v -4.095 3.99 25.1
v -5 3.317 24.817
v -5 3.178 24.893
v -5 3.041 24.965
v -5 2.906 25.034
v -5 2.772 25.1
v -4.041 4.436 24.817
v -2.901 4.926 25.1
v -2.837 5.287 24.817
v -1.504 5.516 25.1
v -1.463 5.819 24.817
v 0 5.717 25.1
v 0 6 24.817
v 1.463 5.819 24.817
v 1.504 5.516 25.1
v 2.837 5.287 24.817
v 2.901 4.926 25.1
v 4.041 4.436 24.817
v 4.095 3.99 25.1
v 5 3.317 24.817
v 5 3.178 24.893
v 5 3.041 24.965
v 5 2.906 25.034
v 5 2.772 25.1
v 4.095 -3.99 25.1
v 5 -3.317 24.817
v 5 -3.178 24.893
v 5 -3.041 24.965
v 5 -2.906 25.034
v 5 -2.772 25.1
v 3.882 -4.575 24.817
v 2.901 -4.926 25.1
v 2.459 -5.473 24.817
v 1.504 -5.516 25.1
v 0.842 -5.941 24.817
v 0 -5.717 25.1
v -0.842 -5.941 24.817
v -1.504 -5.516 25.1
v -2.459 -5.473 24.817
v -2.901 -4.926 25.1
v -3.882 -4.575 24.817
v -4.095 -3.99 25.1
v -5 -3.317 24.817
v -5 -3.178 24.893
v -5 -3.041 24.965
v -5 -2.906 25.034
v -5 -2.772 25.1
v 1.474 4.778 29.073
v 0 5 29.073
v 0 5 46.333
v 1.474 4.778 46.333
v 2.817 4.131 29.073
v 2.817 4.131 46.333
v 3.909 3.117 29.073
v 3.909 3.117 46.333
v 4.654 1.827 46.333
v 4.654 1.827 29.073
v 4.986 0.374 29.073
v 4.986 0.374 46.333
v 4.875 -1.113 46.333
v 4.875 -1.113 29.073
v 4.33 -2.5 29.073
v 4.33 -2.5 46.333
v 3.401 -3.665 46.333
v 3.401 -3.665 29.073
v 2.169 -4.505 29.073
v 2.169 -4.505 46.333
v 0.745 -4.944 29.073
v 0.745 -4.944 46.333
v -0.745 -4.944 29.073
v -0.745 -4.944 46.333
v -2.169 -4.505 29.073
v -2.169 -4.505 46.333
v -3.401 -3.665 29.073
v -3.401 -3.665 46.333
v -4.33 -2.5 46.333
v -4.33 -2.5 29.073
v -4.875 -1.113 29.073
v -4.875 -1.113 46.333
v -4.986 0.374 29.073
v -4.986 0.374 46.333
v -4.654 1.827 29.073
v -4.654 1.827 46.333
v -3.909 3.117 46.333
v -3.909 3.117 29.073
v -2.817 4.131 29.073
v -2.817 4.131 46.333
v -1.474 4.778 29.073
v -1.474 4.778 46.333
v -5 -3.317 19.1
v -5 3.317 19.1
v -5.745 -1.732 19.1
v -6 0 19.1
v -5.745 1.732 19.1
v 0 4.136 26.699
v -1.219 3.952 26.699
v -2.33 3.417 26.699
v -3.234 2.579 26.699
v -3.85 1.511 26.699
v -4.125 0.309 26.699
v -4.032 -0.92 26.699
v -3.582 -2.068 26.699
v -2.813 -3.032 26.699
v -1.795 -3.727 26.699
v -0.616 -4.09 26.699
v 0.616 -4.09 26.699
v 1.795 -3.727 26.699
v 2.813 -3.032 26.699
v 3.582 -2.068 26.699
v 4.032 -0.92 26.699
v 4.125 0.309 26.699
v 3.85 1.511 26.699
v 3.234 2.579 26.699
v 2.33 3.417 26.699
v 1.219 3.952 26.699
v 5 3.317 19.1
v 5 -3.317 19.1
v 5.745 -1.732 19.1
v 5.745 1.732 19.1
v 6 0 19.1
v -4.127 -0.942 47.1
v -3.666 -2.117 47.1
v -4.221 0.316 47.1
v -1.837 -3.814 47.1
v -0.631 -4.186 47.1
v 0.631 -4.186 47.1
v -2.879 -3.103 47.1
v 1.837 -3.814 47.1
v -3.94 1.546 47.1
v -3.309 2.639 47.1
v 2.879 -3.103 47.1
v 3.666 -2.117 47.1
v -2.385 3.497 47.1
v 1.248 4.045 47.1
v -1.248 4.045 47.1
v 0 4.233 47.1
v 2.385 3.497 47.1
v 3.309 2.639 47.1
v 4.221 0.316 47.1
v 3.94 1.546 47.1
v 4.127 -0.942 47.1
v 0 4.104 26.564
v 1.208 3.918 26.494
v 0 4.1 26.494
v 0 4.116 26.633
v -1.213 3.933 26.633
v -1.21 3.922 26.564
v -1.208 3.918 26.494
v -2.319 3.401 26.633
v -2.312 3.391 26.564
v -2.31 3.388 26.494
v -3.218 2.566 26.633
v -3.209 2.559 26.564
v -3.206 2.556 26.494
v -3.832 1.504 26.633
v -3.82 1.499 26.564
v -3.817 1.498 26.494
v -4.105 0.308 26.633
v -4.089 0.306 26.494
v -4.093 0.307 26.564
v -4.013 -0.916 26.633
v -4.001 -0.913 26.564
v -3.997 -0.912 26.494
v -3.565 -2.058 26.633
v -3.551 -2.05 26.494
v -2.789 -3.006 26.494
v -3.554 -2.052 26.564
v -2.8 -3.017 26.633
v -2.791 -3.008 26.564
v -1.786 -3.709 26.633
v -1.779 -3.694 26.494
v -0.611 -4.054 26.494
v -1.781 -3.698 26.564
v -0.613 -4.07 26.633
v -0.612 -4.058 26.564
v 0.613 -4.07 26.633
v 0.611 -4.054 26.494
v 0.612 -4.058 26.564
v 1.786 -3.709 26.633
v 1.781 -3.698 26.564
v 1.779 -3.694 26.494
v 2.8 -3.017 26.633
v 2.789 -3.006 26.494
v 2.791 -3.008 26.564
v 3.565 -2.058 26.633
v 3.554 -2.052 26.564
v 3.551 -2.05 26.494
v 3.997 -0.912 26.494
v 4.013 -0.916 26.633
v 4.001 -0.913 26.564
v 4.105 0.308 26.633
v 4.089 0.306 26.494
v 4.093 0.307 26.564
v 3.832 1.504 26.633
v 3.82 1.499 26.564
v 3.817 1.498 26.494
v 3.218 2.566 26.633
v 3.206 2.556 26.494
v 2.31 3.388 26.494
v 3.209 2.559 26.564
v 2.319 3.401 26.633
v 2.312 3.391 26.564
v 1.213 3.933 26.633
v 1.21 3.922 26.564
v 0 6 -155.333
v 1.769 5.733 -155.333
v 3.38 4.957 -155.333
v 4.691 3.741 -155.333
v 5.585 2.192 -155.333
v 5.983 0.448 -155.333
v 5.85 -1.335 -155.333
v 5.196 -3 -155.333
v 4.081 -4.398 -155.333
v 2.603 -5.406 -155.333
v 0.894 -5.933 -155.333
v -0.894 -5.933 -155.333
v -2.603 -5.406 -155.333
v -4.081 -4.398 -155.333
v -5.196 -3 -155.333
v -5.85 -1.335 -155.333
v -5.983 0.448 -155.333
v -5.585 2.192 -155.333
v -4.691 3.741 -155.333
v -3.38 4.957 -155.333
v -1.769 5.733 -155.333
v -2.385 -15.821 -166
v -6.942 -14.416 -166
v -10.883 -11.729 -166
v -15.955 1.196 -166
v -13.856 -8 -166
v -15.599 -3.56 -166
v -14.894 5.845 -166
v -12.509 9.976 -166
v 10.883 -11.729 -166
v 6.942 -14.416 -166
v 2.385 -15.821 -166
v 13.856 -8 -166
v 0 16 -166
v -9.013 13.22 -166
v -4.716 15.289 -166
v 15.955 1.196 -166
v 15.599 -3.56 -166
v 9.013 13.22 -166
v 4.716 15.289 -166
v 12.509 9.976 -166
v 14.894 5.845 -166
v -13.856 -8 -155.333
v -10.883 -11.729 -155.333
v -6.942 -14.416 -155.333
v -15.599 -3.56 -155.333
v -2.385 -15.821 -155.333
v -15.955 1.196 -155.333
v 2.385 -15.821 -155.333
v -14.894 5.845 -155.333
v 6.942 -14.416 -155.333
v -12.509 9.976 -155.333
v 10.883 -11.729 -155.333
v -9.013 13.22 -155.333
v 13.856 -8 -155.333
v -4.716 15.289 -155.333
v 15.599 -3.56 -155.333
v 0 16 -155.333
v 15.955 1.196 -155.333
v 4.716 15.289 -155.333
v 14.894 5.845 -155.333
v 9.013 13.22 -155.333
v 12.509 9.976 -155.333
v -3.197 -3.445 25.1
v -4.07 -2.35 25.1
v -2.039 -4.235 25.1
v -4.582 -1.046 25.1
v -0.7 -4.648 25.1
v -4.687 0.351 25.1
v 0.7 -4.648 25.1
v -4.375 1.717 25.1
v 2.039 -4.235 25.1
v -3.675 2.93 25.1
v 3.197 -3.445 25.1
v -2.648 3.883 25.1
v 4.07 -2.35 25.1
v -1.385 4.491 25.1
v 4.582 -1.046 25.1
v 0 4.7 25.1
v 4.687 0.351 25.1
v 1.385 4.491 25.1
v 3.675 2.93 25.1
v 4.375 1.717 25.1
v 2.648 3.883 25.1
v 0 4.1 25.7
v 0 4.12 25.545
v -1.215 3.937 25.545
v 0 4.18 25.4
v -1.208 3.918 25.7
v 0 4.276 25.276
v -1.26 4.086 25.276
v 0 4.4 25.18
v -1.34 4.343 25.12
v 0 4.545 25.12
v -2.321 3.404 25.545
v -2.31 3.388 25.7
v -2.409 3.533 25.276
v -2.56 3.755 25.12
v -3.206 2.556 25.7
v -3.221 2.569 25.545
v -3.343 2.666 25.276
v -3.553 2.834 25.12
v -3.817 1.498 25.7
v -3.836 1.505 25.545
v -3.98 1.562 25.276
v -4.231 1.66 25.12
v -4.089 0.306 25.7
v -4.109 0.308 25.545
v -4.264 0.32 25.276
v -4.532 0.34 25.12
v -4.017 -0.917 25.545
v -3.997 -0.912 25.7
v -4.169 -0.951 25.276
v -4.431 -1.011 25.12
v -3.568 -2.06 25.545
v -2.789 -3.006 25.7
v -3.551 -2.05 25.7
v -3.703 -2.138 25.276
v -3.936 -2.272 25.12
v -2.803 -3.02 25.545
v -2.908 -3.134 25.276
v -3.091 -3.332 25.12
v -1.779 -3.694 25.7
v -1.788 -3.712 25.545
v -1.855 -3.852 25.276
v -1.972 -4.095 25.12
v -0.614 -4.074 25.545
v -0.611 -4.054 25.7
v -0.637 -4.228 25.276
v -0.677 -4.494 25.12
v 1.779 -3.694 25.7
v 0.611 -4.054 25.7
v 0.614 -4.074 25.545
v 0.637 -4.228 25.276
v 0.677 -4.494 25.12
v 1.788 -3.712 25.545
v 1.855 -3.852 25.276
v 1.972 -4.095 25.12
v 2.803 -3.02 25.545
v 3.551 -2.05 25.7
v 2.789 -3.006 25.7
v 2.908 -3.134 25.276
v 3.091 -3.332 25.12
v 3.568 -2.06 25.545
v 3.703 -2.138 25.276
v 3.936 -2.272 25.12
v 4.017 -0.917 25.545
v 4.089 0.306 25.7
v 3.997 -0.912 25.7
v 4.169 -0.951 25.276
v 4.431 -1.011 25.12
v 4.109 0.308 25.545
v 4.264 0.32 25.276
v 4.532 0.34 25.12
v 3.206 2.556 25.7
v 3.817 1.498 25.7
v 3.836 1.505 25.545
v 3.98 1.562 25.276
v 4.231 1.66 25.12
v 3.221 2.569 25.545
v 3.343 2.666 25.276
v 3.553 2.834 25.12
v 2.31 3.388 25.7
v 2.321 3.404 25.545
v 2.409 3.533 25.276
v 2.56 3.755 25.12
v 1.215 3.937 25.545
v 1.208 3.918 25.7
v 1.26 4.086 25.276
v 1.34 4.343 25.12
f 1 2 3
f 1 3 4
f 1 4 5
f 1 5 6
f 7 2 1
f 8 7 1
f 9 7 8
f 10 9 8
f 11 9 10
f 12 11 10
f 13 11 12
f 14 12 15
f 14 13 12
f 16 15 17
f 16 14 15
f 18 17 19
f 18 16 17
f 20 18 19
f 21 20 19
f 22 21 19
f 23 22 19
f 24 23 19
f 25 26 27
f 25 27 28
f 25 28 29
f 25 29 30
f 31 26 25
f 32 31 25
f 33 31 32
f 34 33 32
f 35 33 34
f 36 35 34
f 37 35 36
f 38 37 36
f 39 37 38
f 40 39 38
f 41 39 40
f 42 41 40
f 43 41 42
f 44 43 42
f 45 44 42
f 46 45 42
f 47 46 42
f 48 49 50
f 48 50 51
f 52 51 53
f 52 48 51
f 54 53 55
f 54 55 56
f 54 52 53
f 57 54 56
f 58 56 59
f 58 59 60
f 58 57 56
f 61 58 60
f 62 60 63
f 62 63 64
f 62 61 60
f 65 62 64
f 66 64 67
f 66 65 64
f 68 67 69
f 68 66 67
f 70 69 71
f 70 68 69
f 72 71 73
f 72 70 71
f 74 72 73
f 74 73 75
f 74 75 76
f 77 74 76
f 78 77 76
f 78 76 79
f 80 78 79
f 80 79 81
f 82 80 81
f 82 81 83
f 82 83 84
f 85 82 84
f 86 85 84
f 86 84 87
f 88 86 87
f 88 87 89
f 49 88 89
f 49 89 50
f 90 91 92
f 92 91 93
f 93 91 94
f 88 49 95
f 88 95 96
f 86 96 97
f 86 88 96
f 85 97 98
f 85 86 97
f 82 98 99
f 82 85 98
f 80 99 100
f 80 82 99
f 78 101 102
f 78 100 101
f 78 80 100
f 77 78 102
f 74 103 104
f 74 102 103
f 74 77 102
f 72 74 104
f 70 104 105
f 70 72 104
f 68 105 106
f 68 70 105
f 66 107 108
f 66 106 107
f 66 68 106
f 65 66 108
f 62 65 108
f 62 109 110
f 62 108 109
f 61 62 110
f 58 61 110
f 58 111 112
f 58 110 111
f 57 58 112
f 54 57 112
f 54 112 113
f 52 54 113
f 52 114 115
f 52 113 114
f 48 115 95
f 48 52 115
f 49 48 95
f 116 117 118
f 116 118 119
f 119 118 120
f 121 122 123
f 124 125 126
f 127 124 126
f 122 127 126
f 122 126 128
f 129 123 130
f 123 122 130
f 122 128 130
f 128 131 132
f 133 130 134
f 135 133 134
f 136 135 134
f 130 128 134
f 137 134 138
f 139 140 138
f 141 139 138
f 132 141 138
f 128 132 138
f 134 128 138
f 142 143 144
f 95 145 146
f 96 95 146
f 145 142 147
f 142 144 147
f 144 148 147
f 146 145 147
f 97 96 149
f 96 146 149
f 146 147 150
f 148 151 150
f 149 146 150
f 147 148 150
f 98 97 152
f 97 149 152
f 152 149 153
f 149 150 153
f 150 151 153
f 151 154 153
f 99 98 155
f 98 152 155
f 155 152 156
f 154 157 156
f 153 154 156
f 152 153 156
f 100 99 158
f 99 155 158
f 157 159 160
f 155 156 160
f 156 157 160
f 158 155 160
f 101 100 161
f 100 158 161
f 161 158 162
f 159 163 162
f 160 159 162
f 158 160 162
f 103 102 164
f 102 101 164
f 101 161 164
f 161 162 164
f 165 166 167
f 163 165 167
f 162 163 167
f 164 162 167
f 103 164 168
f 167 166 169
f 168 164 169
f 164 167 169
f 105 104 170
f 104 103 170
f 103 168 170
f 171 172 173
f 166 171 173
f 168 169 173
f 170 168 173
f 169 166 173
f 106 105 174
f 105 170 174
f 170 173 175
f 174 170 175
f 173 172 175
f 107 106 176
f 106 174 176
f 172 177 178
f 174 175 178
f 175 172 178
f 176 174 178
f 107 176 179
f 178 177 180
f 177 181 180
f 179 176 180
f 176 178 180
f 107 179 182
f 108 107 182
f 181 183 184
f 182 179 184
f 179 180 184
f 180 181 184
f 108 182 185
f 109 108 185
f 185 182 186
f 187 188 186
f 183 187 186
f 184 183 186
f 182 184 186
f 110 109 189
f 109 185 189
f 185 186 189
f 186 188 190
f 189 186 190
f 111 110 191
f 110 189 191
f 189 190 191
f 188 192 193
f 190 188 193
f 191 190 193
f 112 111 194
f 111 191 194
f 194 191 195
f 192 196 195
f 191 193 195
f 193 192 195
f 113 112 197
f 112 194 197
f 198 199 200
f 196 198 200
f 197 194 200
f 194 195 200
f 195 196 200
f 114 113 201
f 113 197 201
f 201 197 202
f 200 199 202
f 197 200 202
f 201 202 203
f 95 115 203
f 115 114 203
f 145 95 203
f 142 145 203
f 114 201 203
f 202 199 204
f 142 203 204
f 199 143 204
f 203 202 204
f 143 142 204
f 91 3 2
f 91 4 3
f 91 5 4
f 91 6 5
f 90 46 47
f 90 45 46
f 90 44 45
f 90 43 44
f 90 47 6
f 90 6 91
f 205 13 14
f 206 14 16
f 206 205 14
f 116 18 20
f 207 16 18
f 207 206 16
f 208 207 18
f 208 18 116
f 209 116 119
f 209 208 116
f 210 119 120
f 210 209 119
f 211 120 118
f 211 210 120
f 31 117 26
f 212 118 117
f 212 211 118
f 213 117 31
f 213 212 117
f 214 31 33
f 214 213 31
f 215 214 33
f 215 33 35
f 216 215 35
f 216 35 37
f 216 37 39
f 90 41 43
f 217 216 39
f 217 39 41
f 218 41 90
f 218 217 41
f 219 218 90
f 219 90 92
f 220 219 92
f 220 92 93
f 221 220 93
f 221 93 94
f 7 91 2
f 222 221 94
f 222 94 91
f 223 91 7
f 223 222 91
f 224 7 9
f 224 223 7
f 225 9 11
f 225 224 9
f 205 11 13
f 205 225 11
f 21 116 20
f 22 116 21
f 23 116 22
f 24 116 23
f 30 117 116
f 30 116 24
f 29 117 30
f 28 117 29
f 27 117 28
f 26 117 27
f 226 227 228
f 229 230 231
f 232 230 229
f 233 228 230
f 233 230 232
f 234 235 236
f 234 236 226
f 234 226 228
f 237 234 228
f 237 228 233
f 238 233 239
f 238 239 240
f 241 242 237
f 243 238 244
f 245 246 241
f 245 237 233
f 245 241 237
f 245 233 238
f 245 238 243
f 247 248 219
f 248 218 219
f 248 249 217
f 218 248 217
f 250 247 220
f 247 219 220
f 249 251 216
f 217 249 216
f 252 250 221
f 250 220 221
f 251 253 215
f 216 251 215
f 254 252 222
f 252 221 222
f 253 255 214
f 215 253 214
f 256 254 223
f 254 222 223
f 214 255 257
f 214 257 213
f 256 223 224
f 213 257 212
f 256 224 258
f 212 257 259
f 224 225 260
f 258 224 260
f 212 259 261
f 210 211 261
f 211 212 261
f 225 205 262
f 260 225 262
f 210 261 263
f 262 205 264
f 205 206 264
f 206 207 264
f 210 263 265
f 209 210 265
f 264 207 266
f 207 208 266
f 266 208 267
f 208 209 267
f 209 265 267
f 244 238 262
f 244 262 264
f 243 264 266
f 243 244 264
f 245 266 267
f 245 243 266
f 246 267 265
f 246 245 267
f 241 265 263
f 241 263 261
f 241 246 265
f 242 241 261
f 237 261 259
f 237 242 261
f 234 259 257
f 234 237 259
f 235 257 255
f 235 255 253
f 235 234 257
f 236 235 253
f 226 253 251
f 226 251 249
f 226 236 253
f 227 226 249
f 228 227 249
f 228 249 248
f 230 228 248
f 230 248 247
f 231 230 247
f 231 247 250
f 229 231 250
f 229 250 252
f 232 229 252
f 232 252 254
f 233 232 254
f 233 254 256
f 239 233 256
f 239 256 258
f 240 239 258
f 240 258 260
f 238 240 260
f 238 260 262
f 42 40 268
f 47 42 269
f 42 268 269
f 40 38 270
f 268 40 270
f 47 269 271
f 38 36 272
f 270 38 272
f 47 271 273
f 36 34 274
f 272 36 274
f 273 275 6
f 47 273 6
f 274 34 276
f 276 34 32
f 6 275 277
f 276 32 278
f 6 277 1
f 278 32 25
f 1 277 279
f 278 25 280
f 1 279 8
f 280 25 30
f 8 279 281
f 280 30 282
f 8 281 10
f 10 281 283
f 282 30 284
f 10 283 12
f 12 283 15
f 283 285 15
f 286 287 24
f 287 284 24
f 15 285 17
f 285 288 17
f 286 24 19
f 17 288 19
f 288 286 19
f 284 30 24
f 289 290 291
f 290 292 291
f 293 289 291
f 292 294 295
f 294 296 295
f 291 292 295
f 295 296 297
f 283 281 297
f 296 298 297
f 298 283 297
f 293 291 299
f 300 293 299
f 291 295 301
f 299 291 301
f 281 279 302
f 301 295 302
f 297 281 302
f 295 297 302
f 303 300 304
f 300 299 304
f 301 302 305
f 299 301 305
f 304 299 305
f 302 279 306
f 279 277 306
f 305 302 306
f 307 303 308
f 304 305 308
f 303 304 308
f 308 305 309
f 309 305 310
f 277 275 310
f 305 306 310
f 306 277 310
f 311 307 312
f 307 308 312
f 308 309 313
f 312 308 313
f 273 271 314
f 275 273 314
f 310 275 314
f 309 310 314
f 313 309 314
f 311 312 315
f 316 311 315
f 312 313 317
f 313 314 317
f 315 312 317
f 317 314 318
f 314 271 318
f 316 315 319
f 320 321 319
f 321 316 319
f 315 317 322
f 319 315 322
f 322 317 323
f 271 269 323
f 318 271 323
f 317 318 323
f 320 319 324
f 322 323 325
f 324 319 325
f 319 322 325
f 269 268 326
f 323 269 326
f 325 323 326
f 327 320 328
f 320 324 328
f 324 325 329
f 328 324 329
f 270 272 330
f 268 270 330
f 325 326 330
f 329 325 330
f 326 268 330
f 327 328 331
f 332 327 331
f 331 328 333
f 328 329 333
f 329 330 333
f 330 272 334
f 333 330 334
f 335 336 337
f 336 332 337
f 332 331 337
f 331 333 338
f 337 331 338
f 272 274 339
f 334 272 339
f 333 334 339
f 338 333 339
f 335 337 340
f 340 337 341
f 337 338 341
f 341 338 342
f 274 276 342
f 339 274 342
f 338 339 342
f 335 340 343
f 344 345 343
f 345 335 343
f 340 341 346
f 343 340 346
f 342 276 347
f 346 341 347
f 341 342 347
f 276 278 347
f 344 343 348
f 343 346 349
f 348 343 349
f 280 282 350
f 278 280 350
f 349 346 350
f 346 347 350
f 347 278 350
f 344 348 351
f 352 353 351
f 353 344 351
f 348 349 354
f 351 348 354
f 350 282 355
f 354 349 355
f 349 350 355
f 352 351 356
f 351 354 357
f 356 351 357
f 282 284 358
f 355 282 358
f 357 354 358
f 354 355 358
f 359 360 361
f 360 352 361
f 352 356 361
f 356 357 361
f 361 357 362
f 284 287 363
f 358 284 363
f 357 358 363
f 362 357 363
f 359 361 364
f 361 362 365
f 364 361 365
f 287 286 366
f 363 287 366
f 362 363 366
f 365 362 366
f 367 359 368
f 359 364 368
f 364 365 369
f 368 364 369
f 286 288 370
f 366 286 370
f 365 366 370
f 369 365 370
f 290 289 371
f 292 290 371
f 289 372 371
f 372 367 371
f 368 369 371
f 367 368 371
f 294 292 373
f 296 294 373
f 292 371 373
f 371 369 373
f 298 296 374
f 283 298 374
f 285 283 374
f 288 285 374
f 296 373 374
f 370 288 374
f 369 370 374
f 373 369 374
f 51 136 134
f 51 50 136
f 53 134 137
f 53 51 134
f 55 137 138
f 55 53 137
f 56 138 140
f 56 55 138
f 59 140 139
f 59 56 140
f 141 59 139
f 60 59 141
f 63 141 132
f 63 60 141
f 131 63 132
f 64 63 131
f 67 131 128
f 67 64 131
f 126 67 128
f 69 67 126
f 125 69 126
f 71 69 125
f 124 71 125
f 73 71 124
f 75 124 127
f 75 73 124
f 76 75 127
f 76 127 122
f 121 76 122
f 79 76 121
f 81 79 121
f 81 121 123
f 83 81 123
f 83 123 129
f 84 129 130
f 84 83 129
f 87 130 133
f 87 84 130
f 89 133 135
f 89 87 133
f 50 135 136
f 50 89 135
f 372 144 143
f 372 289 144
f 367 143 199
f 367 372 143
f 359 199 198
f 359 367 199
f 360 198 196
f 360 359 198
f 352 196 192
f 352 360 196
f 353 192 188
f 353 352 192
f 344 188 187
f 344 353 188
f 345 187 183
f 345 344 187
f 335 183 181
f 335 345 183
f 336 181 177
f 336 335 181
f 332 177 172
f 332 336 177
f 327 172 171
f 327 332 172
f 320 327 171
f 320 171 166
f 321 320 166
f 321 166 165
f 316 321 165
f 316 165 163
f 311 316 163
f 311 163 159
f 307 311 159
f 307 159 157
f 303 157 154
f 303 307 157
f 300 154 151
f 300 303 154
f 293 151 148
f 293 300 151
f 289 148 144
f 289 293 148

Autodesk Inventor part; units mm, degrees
sketch "Sketch_1" plane through (0, 0, 0) normal (1, 0, 0) x (0, 1, 0)
  line L0 (0, -166) -> (0, 25.1)
  line L1 (0, 25.1) -> (5.7172, 25.1)
  line L2 (5.7172, 25.1) -> (6, 24.8172)
  line L3 (6, 24.8172) -> (6, -155.3333)
  line L4 (6, -155.3333) -> (16, -155.3333)
  line L5 (16, -155.3333) -> (16, -166)
  line L6 (16, -166) -> (0, -166)
  line L7 (0, -166) -> (0, 25.1)
revolve "Revolution1" add sketch "Sketch_1" angle 360 about axis through (0, 0, -166) along (0, 0, -1)
sketch "Sketch_2" plane through (0, 0, 0) normal (0, 1, 0) x (-1, 0, 0)
  line L0 (10, 39.1) -> (-10, 39.1)
  line L1 (-10, 39.1) -> (-10, 19.1)
  line L2 (-10, 19.1) -> (-5, 19.1)
  line L3 (-5, 19.1) -> (-5, 31.1)
  line L4 (-5, 31.1) -> (5, 31.1)
  line L5 (5, 31.1) -> (5, 19.1)
  line L6 (5, 19.1) -> (10, 19.1)
  line L7 (10, 19.1) -> (10, 39.1)
extrude "Extrusion1" cut sketch "Sketch_2" along normal mid plane 20
sketch "Sketch_4" plane through (0, 0, 0) normal (1, 0, 0) x (0, 1, 0)
  line L0 (0, 24.5) -> (0, 47.1)
  line L1 (0, 47.1) -> (4.233, 47.1)
  line L2 (4.233, 47.1) -> (5, 46.333)
  line L3 (5, 46.333) -> (5, 29.0727)
  line L4 (5, 29.0727) -> (4.1362, 26.6994)
  arc A0 (4.1362, 26.6994) -> (4.1, 26.4942) centre (4.7, 26.4942) ccw
  line L5 (4.1, 26.4942) -> (4.1, 25.7)
  arc A1 (4.1, 25.7) -> (4.7, 25.1) centre (4.7, 25.7) ccw
  line L6 (4.7, 25.1) -> (4.7, 24.5)
  line L7 (4.7, 24.5) -> (0, 24.5)
  line L8 (0, 24.5) -> (0, 47.1)
revolve "Revolution2" add sketch "Sketch_4" angle 360 about axis through (0, 0, 24.5) along (0, 0, -1)
thread "Thread1" size "M10x1.25" class "6g" standard "ISO Metric profile" full length
ref_plane "FDT_PIRODACC_XY" through (0, 0, 34.1) normal (0, 0, 1) x (1, 0, 0)
ref_plane "FDT_PIRODACC_YZ" through (0, 0, 34.1) normal (1, 0, 0) x (0, 1, 0)
ref_plane "FDT_PIRODACC_ZX" through (0, 0, 34.1) normal (0, 1, 0) x (0, 0, 1)
ref_plane "NUT_XY" through (0, 0, 34.1) normal (0, 0, -1) x (1, 0, 0)
ref_plane "NUT_YZ" through (0, 0, 34.1) normal (1, 0, 0) x (0, -1, 0)
ref_plane "NUT_ZX" through (0, 0, 34.1) normal (0, -1, 0) x (0, 0, -1)
ref_plane "P_XY" through (0, 0, -166) normal (0, 0, -1) x (0, 1, 0)
ref_plane "P_YZ" through (0, 0, -166) normal (0, 1, 0) x (1, 0, 0)
ref_plane "P_ZX" through (0, 0, -166) normal (1, 0, 0) x (0, 0, -1)
properties part number "1463250 DSBC-32-100_(K)"
